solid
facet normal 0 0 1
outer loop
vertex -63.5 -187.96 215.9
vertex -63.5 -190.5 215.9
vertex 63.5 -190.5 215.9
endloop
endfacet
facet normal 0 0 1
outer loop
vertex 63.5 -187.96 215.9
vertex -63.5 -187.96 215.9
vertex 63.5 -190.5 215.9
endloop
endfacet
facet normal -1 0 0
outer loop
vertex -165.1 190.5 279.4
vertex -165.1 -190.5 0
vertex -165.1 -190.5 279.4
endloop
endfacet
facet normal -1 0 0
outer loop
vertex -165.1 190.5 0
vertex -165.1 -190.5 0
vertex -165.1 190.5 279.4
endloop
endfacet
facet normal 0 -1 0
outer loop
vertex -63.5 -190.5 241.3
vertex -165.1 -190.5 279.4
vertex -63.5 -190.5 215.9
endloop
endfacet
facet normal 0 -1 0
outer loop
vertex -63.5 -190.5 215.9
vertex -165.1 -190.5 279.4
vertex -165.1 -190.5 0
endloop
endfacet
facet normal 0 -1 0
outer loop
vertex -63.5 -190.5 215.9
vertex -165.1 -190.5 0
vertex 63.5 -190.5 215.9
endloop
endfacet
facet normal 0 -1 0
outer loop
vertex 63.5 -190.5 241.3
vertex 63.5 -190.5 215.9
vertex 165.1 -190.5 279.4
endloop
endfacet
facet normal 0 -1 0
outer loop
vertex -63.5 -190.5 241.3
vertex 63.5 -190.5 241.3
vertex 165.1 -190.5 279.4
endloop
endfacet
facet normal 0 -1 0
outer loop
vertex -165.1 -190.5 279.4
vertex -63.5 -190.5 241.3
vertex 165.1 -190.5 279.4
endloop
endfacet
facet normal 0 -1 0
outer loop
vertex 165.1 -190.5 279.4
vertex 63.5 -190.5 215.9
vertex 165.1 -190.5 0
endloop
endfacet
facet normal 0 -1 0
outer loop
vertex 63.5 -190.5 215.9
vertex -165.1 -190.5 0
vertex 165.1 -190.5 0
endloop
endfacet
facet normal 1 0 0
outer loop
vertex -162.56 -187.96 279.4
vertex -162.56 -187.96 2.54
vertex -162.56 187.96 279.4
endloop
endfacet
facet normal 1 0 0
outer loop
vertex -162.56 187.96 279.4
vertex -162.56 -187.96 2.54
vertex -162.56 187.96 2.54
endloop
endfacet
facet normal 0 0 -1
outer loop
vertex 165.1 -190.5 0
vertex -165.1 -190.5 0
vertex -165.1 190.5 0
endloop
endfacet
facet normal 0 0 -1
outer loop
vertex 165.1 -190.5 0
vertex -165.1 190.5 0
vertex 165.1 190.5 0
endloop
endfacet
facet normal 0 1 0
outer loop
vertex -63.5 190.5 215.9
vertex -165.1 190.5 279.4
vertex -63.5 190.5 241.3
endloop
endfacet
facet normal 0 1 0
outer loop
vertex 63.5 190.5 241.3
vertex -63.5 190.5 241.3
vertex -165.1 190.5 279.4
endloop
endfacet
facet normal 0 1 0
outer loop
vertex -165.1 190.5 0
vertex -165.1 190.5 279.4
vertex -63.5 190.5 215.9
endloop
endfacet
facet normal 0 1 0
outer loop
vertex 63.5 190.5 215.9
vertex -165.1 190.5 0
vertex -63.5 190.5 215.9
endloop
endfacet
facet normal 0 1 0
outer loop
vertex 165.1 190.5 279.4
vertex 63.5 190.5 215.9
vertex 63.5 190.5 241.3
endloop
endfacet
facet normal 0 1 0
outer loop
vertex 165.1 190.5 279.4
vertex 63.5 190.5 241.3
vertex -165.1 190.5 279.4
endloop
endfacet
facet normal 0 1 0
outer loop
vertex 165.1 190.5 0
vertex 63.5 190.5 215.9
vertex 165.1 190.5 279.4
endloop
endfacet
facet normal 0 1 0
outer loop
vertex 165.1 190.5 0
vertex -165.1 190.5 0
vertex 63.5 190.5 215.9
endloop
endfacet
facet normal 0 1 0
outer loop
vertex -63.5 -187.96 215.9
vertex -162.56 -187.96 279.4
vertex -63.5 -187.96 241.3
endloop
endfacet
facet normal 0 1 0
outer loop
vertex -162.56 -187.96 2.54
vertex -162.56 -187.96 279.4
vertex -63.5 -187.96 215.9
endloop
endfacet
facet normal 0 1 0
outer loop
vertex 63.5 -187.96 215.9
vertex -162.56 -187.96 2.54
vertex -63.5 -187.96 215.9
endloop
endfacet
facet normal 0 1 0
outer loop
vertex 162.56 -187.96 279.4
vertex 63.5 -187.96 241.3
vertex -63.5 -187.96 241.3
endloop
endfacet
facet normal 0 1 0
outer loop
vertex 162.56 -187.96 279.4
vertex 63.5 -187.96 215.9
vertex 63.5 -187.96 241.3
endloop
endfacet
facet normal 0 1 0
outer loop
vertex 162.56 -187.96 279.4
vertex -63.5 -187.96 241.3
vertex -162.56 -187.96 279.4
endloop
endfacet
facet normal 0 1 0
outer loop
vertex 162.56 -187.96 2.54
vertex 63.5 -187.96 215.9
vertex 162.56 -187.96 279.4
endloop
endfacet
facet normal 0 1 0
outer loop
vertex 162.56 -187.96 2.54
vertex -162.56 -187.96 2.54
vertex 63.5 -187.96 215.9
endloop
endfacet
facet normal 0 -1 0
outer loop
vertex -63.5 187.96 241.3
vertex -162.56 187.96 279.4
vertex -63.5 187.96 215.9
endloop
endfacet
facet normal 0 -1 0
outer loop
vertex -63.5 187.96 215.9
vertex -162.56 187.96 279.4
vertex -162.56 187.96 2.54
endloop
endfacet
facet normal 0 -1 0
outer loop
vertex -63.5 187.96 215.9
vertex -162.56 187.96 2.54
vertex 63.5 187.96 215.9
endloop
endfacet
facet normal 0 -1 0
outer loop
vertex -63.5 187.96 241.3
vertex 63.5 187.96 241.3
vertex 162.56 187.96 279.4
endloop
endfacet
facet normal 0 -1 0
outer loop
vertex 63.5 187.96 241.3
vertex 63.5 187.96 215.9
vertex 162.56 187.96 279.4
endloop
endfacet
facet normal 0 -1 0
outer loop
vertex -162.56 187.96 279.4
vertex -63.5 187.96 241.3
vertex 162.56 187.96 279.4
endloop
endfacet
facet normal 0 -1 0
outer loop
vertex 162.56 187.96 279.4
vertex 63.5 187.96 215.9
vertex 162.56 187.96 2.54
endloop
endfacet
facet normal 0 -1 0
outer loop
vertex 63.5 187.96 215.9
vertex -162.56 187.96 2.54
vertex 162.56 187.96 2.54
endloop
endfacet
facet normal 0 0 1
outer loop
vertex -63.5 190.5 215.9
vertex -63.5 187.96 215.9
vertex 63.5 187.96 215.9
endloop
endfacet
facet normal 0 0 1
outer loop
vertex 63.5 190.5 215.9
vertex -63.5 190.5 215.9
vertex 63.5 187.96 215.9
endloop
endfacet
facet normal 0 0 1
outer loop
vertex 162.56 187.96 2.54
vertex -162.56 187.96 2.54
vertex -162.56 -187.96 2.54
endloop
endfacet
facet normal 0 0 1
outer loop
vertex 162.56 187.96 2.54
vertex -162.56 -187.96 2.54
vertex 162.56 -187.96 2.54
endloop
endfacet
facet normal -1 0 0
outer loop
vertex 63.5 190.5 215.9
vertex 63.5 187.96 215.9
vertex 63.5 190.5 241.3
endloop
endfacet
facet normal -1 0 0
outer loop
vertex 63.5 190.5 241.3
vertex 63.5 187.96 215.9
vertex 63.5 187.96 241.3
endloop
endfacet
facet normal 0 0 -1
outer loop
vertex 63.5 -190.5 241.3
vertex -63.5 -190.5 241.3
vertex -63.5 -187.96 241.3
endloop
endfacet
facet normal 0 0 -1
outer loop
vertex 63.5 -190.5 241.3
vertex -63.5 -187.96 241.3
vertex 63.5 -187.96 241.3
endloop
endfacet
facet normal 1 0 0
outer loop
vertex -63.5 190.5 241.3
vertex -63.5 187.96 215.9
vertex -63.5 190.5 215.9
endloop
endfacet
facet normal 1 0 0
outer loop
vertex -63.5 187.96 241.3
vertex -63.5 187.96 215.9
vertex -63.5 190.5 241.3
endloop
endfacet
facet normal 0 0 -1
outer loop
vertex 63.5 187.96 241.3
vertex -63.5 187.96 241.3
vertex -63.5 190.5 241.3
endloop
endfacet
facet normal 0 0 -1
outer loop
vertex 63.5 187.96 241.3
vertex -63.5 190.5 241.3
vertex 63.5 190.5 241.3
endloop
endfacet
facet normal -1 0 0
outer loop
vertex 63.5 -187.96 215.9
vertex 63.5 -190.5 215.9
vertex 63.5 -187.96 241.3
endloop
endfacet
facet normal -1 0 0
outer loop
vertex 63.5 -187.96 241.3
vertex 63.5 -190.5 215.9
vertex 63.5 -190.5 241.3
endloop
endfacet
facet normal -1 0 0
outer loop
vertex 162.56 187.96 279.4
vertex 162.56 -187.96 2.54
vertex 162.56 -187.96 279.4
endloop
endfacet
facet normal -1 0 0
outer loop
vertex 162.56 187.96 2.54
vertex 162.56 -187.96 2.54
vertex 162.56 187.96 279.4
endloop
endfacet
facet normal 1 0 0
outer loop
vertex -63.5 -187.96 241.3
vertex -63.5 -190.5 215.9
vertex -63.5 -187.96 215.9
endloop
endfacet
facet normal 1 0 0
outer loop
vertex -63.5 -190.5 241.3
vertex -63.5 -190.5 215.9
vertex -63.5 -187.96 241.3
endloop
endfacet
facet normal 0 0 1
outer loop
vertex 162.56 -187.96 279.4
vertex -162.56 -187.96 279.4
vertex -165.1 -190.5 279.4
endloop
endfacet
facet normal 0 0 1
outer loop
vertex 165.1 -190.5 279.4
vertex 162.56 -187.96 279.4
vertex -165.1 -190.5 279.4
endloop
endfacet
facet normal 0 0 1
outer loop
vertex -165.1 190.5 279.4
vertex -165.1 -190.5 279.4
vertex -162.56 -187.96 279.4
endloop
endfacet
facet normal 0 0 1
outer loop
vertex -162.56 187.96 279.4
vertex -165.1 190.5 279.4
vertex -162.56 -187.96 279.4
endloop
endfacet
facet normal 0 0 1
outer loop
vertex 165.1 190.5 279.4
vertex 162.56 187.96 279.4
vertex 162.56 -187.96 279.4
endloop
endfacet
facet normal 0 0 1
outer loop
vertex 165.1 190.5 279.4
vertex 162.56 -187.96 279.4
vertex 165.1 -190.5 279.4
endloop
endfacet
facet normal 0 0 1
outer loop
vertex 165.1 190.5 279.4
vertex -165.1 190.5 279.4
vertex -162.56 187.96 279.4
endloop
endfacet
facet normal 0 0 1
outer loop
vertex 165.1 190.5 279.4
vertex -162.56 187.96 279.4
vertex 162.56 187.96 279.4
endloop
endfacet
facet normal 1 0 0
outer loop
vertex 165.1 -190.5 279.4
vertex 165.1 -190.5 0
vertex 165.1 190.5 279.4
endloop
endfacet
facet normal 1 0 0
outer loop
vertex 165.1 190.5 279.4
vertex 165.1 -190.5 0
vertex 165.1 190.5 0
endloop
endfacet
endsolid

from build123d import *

# Parameters (mm, degrees)
F0_W     = 330.2
F0_H     = 381
F1_DEPTH = 279.4
F2_T     = -2.54
F3_W     = 127
F3_H     = 25.4
F4_DEPTH = 381.001


with BuildPart() as f1:
    # F0 (on Top) → F1 (new body)
    with BuildSketch(Plane.XY):
        Rectangle(F0_W, F0_H)
    extrude(amount=F1_DEPTH)

    # F2
    f2_openings = [f1.faces().sort_by_distance(p)[0] for p in [
        (0, 0, 279.4),
    ]]
    offset(amount=F2_T, openings=f2_openings)

    # F3 (on face) → F4 (cut, through all)
    with BuildSketch(Plane.XZ.offset(190.5)):
        with Locations((0, 228.6)):
            Rectangle(F3_W, F3_H)
    extrude(amount=-F4_DEPTH, mode=Mode.SUBTRACT)


solid = f1.part
